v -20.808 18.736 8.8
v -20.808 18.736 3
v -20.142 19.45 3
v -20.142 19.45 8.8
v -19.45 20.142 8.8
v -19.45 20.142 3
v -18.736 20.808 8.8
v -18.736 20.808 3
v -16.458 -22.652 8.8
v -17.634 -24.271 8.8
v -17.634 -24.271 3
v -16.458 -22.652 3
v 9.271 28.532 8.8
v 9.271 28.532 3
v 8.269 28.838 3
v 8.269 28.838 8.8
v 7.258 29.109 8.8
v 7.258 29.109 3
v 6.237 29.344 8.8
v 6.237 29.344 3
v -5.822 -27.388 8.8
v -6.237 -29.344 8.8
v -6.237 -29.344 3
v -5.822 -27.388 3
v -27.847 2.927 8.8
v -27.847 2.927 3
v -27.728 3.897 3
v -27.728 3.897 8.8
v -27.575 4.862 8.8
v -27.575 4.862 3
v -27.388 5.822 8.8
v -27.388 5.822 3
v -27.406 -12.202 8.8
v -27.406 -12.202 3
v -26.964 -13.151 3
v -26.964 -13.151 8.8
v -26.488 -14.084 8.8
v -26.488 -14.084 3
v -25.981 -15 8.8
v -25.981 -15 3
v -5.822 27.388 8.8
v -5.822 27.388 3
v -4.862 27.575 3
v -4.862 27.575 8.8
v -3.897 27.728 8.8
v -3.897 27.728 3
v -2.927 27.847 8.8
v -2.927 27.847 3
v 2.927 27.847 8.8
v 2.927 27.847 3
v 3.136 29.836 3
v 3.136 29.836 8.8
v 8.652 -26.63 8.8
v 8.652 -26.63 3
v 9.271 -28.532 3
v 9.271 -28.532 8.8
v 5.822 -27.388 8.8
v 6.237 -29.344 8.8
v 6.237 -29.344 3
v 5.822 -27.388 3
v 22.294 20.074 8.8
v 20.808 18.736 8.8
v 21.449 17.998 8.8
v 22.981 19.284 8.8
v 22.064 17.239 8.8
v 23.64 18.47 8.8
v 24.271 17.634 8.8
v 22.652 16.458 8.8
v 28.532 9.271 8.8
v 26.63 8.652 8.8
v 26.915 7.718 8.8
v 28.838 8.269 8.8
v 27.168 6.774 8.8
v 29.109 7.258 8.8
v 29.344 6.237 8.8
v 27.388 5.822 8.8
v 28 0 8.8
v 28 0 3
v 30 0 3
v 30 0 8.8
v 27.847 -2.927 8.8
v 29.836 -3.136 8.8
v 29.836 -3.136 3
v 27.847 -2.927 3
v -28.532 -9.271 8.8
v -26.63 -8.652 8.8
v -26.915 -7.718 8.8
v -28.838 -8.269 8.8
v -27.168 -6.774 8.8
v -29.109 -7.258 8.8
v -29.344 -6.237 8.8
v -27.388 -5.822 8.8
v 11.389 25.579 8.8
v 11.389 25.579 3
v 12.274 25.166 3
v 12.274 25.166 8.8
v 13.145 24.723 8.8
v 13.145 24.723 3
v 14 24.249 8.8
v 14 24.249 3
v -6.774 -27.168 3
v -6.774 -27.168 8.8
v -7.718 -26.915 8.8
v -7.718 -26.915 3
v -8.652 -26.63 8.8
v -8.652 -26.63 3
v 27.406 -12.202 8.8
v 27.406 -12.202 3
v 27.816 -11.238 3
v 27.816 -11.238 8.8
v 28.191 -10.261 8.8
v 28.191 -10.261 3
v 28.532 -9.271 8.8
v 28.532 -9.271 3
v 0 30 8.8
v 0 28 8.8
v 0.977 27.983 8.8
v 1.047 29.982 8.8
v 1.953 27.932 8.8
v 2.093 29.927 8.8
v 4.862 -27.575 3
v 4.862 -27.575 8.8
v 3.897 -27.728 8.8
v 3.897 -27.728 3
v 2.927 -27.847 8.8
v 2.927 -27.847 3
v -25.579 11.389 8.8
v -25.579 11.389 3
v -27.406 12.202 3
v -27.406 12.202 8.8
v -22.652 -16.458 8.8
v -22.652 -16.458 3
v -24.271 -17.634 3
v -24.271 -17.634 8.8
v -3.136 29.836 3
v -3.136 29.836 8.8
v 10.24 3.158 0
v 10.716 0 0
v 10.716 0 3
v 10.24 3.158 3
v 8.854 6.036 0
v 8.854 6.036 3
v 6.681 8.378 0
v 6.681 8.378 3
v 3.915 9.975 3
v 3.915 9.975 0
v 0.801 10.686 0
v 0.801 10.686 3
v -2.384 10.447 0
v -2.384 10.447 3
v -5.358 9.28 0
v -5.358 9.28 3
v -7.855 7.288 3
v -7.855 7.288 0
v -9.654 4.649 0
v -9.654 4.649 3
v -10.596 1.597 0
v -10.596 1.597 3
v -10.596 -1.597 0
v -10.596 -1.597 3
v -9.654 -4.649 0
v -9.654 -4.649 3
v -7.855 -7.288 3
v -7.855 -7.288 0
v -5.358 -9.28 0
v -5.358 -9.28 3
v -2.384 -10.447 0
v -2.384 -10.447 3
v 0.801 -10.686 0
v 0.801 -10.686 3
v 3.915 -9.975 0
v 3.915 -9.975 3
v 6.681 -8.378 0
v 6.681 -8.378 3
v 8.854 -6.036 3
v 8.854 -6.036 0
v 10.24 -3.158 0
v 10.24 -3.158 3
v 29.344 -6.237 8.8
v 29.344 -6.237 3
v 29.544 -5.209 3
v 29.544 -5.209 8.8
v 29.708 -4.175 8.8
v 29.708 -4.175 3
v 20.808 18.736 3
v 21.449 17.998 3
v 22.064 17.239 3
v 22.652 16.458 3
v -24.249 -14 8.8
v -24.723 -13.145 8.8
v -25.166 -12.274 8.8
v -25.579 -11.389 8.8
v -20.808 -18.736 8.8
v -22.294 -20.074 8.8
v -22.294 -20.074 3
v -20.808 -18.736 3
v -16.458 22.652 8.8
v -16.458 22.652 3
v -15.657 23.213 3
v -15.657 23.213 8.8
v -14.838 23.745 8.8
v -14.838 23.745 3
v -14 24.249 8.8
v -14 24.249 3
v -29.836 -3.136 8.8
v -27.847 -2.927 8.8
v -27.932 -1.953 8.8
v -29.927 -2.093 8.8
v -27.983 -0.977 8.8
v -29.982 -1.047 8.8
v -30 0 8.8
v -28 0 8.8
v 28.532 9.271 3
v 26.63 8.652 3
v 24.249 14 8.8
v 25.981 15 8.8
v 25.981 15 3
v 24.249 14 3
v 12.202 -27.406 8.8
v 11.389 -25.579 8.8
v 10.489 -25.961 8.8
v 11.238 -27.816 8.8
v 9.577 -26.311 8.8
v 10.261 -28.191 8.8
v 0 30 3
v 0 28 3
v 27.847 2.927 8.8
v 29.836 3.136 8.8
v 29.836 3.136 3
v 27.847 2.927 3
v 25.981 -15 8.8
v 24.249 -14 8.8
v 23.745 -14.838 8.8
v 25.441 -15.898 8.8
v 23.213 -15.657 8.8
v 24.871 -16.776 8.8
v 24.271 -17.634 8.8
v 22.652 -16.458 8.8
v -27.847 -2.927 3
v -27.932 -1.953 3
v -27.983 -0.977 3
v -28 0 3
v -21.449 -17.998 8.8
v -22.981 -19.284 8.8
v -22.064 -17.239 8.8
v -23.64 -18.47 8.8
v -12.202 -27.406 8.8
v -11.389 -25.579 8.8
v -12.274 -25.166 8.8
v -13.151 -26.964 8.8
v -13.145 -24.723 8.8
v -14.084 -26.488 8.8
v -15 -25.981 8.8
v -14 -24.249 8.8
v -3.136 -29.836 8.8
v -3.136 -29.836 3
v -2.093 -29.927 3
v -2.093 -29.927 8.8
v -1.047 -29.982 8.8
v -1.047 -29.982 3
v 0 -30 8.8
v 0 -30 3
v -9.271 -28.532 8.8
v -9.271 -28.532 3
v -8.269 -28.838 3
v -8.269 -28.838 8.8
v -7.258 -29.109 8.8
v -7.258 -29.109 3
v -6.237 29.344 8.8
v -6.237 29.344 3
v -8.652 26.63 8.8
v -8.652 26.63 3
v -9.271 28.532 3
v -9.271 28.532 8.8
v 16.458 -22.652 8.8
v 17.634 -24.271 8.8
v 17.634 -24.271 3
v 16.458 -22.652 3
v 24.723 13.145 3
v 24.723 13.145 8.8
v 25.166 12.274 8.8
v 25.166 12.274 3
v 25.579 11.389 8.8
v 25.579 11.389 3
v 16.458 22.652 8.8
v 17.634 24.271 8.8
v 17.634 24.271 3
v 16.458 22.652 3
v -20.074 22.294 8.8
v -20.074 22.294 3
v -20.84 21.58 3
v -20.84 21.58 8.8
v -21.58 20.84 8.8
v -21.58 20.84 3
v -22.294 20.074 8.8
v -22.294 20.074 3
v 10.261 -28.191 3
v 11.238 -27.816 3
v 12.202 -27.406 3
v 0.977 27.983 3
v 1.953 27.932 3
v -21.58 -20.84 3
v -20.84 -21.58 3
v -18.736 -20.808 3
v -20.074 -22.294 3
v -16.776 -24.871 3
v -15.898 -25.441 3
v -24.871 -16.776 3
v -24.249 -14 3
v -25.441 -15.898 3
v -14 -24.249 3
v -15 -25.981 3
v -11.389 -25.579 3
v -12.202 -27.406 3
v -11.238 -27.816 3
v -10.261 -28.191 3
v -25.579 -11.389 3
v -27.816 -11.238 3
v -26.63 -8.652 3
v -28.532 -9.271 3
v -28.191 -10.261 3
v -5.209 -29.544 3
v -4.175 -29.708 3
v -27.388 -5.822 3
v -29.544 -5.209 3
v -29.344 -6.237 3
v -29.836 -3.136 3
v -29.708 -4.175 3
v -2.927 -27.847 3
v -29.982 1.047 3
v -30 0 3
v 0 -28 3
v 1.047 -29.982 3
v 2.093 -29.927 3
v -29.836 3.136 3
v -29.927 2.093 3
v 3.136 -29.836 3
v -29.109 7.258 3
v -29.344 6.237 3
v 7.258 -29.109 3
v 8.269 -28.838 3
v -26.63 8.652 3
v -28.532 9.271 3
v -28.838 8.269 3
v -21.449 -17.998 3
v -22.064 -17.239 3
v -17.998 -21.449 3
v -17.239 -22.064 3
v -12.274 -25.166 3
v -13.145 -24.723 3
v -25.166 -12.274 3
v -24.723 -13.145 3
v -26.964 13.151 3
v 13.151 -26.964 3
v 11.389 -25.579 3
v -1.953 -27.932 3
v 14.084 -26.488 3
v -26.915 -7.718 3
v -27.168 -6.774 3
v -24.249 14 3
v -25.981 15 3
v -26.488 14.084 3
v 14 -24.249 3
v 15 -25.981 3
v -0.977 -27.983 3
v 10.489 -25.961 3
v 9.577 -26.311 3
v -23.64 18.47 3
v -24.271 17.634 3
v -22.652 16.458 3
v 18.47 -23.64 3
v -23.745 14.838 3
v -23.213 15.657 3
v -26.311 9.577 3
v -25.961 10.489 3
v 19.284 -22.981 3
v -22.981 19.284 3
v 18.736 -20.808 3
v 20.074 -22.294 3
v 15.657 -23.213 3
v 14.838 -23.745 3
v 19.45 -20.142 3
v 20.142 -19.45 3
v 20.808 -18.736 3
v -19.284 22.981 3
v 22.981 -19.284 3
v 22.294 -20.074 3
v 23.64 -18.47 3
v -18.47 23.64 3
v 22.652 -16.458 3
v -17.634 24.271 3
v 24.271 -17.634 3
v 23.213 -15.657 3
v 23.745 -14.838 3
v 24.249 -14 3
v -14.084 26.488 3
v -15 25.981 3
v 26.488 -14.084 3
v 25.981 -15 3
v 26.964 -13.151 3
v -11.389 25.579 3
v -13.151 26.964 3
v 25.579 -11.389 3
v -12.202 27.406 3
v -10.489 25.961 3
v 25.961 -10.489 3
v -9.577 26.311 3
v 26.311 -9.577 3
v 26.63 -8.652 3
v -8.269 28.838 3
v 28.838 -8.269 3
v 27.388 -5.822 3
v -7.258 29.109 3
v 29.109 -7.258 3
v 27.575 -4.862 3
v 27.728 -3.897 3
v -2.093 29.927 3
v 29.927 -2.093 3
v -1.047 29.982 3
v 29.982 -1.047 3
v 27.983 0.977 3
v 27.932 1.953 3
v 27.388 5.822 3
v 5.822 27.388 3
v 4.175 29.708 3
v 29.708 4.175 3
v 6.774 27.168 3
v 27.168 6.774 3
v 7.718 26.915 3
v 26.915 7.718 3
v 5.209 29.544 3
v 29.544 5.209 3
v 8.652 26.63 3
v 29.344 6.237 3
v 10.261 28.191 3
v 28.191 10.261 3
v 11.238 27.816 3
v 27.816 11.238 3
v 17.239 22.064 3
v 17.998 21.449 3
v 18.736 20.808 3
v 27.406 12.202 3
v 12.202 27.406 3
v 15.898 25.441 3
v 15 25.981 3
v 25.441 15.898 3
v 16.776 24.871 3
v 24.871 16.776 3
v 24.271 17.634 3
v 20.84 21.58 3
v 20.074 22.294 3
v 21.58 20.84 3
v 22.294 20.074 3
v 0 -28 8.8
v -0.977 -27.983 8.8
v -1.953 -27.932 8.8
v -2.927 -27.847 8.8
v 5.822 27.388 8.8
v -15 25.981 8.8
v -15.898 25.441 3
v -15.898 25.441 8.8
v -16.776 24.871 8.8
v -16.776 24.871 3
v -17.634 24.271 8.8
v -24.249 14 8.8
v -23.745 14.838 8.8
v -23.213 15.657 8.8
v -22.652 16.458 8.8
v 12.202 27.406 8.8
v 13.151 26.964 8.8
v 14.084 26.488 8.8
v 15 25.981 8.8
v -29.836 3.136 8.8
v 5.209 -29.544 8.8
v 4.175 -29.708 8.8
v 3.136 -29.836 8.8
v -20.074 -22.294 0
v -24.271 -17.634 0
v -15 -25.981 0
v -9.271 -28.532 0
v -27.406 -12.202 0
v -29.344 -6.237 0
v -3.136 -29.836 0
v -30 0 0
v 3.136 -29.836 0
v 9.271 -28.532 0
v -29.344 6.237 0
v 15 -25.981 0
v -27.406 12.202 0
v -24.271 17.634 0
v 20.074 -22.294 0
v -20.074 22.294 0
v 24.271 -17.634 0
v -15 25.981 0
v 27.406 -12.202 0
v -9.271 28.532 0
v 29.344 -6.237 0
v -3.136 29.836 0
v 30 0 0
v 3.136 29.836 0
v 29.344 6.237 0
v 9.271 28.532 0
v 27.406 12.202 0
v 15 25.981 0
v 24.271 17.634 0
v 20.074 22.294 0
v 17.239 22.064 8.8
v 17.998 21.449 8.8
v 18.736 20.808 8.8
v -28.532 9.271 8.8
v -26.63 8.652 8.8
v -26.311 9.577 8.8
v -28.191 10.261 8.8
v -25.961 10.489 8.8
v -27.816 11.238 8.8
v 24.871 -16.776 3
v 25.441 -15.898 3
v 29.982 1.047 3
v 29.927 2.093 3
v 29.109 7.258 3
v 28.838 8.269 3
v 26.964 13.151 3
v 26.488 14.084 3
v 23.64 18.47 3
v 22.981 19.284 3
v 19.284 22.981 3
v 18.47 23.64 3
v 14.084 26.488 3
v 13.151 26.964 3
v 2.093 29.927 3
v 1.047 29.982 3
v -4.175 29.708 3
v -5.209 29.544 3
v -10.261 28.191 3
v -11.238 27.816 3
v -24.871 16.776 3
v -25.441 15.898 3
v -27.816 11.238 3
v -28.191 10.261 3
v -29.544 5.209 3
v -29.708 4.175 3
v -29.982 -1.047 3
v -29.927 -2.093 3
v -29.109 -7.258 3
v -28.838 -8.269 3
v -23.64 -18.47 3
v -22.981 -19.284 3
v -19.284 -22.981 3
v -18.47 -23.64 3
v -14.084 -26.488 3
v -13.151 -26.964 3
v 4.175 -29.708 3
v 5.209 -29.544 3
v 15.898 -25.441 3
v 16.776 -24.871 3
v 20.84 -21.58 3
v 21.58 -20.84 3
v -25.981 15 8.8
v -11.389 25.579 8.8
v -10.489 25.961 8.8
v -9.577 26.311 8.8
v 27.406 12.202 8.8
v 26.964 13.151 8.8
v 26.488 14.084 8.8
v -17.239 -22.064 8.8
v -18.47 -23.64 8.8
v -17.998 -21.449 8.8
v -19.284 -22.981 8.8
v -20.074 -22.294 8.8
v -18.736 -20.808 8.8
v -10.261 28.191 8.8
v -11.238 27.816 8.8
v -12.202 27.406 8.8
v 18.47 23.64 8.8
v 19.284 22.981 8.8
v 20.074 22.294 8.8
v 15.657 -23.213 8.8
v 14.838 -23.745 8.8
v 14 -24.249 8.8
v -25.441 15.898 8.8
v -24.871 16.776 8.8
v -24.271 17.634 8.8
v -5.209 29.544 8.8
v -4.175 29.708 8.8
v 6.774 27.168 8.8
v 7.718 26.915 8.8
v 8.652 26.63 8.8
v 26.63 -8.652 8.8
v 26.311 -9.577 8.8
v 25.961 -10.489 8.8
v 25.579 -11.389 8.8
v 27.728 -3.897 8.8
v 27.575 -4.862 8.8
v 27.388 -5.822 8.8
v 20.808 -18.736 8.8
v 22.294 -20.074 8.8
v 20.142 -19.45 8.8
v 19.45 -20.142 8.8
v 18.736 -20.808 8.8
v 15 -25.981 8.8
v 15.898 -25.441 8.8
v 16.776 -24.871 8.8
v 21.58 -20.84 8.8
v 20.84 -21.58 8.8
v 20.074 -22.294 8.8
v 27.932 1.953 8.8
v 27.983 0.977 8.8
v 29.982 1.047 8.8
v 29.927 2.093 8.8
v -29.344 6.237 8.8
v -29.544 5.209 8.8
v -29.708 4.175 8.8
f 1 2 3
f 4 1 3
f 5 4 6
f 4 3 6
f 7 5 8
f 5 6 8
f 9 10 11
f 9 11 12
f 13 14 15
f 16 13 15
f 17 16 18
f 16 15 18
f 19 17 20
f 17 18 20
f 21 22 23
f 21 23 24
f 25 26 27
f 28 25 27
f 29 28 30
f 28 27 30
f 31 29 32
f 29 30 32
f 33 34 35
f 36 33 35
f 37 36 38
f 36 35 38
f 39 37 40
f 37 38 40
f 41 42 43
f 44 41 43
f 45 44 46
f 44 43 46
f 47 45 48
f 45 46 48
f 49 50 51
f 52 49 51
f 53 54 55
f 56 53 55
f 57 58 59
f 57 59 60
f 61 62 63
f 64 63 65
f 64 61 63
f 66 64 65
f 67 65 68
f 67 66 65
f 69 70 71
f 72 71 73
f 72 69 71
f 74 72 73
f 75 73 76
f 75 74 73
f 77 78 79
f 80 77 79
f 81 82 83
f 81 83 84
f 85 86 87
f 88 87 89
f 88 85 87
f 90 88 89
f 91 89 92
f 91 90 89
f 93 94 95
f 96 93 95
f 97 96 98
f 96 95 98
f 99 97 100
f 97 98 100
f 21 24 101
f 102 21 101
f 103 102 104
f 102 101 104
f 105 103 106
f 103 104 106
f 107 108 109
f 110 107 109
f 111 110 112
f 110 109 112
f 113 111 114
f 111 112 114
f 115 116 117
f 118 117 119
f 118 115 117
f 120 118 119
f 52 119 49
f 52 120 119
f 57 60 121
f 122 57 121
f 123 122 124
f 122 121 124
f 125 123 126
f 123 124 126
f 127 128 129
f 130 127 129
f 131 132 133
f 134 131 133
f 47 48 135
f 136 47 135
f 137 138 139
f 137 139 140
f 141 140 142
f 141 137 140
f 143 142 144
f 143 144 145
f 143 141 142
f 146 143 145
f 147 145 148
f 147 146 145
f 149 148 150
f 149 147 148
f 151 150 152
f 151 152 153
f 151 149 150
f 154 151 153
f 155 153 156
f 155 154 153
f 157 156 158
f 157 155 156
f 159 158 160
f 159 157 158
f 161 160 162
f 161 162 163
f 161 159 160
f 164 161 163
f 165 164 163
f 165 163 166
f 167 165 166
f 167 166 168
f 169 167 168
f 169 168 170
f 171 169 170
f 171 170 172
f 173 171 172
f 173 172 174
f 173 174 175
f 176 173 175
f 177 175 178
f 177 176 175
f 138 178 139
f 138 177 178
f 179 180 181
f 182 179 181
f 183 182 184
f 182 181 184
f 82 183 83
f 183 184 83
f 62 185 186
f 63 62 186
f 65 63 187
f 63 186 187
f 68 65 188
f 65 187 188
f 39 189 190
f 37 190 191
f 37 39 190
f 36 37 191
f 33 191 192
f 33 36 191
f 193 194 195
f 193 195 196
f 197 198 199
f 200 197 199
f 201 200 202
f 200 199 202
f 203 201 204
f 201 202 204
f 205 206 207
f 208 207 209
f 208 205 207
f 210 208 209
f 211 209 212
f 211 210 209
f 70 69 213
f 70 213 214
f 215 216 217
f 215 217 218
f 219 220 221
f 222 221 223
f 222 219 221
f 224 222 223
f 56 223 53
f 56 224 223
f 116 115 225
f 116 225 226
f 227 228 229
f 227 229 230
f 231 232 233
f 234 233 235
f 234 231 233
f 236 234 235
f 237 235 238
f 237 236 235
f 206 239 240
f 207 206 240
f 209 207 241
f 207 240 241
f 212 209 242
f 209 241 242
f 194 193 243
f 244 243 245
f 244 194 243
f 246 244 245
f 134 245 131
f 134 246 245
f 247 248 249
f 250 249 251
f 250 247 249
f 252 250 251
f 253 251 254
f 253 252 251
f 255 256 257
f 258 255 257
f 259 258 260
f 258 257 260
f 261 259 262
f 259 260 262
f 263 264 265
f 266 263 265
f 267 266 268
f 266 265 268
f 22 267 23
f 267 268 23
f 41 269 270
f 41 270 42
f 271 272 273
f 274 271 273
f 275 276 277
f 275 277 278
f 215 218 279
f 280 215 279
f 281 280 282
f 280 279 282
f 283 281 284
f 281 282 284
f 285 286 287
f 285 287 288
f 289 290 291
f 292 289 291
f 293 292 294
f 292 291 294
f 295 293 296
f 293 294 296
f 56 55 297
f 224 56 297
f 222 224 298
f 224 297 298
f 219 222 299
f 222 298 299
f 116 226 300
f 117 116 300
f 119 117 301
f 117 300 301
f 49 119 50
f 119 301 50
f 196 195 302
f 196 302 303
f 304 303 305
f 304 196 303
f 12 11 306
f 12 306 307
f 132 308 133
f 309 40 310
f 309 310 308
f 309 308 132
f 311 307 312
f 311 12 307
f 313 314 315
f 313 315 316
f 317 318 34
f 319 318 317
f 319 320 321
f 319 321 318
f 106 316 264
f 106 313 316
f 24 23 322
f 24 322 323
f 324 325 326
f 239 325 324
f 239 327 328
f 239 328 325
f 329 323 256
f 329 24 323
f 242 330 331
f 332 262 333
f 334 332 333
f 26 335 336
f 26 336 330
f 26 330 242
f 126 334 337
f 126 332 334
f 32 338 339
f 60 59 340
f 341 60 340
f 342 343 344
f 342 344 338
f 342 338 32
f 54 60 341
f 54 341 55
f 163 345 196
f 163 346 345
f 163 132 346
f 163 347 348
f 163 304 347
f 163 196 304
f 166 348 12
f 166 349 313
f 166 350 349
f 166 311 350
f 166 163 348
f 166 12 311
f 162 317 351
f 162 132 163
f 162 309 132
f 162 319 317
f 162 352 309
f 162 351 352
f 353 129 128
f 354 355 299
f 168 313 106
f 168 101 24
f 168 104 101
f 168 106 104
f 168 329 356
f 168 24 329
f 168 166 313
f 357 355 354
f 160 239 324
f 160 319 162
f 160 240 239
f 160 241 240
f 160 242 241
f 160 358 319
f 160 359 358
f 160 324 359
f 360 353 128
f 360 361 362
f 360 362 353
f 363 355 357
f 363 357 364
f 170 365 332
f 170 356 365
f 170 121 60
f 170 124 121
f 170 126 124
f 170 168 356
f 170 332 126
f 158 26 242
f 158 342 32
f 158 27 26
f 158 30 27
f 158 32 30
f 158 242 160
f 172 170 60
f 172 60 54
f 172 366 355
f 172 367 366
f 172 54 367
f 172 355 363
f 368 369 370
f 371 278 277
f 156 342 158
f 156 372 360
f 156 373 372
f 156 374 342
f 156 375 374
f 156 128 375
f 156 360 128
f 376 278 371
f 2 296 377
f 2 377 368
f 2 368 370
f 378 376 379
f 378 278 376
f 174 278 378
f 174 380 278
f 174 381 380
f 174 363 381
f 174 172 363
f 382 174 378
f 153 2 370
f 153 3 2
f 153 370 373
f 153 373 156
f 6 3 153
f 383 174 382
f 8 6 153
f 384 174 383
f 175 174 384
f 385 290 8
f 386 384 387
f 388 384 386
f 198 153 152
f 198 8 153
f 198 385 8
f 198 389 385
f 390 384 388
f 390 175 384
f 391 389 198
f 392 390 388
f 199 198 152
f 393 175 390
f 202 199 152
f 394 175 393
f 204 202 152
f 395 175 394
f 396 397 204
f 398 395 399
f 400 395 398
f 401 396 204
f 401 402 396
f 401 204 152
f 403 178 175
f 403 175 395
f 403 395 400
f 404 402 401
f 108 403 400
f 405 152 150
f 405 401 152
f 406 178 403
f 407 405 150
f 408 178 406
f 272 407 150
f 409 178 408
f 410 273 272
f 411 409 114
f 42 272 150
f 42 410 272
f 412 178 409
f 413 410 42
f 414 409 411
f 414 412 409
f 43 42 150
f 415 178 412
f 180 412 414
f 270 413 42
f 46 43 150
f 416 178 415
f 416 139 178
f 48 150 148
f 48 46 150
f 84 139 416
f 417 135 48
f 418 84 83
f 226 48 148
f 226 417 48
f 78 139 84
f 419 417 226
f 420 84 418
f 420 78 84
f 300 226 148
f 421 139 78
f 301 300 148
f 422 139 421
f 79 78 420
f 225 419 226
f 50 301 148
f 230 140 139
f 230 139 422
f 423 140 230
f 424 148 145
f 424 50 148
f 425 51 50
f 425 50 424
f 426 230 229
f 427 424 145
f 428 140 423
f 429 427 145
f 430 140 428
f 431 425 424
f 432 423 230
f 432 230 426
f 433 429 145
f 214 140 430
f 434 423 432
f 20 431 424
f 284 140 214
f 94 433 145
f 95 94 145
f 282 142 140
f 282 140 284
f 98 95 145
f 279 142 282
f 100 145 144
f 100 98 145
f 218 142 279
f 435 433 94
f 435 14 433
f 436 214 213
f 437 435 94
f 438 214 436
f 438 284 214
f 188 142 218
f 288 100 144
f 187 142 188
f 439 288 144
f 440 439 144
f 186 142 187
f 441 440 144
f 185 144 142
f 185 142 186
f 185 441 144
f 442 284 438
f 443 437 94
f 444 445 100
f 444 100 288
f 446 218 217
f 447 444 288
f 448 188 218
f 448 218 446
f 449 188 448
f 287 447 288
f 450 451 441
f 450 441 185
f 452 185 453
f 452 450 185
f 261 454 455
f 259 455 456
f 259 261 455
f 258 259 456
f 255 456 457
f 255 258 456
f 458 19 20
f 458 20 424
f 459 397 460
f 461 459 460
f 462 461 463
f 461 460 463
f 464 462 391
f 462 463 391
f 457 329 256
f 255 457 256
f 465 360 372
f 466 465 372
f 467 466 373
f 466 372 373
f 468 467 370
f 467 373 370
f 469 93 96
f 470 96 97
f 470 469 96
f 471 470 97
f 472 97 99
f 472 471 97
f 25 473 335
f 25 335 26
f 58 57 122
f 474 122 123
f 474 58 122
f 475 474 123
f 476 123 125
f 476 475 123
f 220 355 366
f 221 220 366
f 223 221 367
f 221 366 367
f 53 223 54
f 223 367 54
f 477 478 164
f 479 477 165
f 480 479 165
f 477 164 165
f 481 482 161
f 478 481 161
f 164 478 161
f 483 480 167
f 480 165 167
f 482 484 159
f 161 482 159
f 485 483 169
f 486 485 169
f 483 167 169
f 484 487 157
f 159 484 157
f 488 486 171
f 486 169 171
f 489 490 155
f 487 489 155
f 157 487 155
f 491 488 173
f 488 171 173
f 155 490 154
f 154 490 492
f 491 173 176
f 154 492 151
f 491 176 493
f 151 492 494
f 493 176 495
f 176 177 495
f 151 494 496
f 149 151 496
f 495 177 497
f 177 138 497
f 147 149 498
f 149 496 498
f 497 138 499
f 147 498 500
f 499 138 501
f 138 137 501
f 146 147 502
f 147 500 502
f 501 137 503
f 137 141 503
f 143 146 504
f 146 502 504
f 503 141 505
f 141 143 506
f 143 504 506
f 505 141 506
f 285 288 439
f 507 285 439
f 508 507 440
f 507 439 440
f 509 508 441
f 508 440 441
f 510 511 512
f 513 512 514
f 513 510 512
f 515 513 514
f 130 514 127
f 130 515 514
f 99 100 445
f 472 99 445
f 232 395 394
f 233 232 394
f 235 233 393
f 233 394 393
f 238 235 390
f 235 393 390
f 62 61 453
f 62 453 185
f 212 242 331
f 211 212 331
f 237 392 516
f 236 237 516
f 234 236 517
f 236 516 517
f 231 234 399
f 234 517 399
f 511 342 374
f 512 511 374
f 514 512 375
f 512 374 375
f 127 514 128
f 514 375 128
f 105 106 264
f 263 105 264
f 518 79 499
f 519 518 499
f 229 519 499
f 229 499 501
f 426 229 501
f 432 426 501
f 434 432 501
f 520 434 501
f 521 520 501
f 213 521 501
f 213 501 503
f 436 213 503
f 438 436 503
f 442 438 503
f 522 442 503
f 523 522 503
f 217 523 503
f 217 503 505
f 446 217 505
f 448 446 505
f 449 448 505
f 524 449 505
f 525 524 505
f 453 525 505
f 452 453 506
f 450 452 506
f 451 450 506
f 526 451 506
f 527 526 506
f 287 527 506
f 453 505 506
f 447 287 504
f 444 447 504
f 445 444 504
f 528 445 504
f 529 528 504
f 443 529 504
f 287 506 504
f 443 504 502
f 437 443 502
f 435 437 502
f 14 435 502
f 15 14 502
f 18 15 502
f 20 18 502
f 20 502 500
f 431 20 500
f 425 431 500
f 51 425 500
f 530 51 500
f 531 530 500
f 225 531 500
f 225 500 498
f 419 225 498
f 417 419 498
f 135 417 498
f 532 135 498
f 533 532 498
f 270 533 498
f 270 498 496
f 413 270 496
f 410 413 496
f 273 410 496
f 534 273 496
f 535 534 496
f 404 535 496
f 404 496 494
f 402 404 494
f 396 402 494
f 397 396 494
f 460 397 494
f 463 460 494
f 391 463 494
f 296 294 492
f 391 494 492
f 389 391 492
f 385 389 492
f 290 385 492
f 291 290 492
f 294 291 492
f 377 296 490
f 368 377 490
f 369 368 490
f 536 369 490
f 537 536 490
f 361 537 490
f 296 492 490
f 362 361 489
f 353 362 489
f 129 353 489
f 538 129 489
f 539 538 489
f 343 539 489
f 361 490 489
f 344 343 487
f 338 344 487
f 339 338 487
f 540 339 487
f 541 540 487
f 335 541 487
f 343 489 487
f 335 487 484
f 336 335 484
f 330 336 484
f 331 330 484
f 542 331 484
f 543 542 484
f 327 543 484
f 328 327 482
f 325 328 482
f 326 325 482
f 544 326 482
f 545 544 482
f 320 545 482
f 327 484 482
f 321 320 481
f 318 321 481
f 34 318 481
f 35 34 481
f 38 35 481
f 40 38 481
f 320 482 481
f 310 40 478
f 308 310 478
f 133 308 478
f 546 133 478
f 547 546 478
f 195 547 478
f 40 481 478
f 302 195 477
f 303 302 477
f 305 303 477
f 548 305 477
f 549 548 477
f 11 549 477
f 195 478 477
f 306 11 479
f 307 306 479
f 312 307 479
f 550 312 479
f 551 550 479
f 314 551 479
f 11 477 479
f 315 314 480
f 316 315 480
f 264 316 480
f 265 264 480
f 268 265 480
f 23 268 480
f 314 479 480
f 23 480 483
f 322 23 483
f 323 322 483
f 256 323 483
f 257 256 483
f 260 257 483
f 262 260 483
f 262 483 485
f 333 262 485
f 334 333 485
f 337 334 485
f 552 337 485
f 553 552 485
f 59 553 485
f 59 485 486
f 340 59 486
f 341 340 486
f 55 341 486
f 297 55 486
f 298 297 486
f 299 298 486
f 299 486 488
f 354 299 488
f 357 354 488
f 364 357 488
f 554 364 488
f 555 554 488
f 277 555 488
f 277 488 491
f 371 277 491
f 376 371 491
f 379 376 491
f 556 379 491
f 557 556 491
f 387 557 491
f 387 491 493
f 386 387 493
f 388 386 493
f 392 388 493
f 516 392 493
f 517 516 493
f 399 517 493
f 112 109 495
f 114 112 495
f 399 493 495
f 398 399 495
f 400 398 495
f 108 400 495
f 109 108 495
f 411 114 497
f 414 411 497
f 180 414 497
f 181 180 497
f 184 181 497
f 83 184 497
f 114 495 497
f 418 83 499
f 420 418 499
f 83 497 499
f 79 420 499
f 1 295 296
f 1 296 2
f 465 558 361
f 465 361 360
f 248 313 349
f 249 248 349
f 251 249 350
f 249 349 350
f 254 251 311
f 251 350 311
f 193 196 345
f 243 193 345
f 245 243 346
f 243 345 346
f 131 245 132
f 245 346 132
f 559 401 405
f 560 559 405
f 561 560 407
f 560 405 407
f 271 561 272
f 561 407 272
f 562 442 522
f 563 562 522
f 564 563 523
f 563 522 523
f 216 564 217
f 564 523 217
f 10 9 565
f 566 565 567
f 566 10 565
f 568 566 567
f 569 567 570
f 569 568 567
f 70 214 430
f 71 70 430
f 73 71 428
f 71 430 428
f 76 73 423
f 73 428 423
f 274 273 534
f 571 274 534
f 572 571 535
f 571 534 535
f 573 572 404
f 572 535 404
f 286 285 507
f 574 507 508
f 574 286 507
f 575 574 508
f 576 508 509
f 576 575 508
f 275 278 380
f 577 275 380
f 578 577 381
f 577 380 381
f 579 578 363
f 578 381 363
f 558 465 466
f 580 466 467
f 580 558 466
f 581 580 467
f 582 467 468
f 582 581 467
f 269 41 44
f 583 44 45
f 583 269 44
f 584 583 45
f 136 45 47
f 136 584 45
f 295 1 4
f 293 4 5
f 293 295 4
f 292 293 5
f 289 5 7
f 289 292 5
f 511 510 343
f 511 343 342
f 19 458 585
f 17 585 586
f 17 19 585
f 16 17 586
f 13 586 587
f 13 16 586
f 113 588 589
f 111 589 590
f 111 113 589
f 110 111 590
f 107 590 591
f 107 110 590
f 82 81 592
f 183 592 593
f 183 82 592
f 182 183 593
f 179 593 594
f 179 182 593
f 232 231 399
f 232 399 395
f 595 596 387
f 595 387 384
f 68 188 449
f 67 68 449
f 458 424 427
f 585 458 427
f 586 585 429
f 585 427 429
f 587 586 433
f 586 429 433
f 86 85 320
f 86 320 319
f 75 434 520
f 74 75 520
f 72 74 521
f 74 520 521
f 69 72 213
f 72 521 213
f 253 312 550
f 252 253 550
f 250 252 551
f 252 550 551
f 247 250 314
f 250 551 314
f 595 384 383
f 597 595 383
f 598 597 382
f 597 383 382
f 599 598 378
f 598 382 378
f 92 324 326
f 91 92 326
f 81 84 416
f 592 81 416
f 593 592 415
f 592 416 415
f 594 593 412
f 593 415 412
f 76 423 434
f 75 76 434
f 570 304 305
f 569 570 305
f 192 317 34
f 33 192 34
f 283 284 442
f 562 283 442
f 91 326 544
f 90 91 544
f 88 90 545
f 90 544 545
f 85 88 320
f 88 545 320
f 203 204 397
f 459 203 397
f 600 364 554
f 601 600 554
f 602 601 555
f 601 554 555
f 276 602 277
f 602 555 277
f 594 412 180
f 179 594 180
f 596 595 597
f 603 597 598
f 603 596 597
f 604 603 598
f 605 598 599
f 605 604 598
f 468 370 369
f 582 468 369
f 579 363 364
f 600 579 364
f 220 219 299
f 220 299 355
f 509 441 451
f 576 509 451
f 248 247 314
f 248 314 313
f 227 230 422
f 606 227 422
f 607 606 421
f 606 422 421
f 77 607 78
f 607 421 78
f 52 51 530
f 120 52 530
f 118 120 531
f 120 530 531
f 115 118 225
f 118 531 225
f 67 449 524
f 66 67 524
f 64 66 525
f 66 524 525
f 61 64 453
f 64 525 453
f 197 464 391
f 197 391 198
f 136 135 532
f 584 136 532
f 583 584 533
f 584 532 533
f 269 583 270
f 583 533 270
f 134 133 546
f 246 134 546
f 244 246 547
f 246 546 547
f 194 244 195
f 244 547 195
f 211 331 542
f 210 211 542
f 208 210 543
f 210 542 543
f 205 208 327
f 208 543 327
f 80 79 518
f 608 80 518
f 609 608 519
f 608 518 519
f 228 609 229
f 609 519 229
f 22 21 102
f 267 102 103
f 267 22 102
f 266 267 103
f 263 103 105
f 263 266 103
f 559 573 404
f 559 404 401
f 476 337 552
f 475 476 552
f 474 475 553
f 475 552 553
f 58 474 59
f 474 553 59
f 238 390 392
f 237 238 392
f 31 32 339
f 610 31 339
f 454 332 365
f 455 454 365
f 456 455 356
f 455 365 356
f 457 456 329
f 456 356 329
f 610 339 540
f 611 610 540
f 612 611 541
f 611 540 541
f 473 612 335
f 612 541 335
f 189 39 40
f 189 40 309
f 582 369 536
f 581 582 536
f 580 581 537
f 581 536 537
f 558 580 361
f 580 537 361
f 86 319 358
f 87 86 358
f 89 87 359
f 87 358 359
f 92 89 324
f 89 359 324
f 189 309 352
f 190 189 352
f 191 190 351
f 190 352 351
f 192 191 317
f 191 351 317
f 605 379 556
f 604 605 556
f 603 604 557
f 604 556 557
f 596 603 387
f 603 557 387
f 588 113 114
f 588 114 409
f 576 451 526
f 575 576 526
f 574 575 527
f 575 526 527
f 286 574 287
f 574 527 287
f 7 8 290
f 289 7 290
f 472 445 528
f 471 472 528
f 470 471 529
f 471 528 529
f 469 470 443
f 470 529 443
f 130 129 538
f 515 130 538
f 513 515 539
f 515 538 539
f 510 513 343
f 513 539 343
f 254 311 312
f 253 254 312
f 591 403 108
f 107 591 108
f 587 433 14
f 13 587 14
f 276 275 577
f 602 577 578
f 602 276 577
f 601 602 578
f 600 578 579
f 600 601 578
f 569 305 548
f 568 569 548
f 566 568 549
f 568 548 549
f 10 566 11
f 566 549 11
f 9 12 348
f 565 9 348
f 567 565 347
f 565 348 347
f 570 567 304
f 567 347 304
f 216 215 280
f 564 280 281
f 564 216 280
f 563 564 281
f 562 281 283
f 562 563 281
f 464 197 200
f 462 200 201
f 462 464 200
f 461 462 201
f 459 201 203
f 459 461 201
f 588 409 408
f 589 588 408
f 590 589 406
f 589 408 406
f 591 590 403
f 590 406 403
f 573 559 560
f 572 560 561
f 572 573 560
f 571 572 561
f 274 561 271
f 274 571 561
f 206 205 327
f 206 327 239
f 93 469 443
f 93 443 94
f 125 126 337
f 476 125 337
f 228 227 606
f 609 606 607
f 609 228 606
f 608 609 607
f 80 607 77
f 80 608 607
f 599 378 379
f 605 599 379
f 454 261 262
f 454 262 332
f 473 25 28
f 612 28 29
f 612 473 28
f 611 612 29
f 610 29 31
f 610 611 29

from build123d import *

# Parameters (mm, degrees)
SKETCH1_R           = 30
SKETCH1_R_2         = 10.715625
BOSS_EXTRUDE1_DEPTH = 3
BOSS_EXTRUDE2_DEPTH = 5.8
CIRPATTERN1_COUNT   = 30


with BuildPart() as part:
    # Sketch1 → Boss-Extrude1 (new body)
    with BuildSketch(Plane.XY):
        Circle(SKETCH1_R)
        Circle(SKETCH1_R_2, mode=Mode.SUBTRACT)
    extrude(amount=BOSS_EXTRUDE1_DEPTH)

    # Sketch2 → Boss-Extrude2 (add)
    with BuildSketch(Plane.XY.offset(3)):
        with BuildLine():
            Line((0, 30), (0, 28))
            ThreePointArc((0, 28), (1.465406775, 27.961626973), (2.926796971, 27.84661307))
            Line((2.926796971, 27.84661307), (3.135853898, 29.835656861))
            ThreePointArc((3.135853898, 29.835656861), (1.570078687, 29.958886043), (0, 30))
        make_face()
    boss_extrude2 = extrude(amount=BOSS_EXTRUDE2_DEPTH)

    # CirPattern1: Boss-Extrude2 ×30 about axis
    cirpattern1_axis = Axis((0, 0, -106.639759077), (0, 0, 1))
    for i in range(1, CIRPATTERN1_COUNT):
        add(boss_extrude2.rotate(cirpattern1_axis, i * 360 / CIRPATTERN1_COUNT))


solid = part.part
